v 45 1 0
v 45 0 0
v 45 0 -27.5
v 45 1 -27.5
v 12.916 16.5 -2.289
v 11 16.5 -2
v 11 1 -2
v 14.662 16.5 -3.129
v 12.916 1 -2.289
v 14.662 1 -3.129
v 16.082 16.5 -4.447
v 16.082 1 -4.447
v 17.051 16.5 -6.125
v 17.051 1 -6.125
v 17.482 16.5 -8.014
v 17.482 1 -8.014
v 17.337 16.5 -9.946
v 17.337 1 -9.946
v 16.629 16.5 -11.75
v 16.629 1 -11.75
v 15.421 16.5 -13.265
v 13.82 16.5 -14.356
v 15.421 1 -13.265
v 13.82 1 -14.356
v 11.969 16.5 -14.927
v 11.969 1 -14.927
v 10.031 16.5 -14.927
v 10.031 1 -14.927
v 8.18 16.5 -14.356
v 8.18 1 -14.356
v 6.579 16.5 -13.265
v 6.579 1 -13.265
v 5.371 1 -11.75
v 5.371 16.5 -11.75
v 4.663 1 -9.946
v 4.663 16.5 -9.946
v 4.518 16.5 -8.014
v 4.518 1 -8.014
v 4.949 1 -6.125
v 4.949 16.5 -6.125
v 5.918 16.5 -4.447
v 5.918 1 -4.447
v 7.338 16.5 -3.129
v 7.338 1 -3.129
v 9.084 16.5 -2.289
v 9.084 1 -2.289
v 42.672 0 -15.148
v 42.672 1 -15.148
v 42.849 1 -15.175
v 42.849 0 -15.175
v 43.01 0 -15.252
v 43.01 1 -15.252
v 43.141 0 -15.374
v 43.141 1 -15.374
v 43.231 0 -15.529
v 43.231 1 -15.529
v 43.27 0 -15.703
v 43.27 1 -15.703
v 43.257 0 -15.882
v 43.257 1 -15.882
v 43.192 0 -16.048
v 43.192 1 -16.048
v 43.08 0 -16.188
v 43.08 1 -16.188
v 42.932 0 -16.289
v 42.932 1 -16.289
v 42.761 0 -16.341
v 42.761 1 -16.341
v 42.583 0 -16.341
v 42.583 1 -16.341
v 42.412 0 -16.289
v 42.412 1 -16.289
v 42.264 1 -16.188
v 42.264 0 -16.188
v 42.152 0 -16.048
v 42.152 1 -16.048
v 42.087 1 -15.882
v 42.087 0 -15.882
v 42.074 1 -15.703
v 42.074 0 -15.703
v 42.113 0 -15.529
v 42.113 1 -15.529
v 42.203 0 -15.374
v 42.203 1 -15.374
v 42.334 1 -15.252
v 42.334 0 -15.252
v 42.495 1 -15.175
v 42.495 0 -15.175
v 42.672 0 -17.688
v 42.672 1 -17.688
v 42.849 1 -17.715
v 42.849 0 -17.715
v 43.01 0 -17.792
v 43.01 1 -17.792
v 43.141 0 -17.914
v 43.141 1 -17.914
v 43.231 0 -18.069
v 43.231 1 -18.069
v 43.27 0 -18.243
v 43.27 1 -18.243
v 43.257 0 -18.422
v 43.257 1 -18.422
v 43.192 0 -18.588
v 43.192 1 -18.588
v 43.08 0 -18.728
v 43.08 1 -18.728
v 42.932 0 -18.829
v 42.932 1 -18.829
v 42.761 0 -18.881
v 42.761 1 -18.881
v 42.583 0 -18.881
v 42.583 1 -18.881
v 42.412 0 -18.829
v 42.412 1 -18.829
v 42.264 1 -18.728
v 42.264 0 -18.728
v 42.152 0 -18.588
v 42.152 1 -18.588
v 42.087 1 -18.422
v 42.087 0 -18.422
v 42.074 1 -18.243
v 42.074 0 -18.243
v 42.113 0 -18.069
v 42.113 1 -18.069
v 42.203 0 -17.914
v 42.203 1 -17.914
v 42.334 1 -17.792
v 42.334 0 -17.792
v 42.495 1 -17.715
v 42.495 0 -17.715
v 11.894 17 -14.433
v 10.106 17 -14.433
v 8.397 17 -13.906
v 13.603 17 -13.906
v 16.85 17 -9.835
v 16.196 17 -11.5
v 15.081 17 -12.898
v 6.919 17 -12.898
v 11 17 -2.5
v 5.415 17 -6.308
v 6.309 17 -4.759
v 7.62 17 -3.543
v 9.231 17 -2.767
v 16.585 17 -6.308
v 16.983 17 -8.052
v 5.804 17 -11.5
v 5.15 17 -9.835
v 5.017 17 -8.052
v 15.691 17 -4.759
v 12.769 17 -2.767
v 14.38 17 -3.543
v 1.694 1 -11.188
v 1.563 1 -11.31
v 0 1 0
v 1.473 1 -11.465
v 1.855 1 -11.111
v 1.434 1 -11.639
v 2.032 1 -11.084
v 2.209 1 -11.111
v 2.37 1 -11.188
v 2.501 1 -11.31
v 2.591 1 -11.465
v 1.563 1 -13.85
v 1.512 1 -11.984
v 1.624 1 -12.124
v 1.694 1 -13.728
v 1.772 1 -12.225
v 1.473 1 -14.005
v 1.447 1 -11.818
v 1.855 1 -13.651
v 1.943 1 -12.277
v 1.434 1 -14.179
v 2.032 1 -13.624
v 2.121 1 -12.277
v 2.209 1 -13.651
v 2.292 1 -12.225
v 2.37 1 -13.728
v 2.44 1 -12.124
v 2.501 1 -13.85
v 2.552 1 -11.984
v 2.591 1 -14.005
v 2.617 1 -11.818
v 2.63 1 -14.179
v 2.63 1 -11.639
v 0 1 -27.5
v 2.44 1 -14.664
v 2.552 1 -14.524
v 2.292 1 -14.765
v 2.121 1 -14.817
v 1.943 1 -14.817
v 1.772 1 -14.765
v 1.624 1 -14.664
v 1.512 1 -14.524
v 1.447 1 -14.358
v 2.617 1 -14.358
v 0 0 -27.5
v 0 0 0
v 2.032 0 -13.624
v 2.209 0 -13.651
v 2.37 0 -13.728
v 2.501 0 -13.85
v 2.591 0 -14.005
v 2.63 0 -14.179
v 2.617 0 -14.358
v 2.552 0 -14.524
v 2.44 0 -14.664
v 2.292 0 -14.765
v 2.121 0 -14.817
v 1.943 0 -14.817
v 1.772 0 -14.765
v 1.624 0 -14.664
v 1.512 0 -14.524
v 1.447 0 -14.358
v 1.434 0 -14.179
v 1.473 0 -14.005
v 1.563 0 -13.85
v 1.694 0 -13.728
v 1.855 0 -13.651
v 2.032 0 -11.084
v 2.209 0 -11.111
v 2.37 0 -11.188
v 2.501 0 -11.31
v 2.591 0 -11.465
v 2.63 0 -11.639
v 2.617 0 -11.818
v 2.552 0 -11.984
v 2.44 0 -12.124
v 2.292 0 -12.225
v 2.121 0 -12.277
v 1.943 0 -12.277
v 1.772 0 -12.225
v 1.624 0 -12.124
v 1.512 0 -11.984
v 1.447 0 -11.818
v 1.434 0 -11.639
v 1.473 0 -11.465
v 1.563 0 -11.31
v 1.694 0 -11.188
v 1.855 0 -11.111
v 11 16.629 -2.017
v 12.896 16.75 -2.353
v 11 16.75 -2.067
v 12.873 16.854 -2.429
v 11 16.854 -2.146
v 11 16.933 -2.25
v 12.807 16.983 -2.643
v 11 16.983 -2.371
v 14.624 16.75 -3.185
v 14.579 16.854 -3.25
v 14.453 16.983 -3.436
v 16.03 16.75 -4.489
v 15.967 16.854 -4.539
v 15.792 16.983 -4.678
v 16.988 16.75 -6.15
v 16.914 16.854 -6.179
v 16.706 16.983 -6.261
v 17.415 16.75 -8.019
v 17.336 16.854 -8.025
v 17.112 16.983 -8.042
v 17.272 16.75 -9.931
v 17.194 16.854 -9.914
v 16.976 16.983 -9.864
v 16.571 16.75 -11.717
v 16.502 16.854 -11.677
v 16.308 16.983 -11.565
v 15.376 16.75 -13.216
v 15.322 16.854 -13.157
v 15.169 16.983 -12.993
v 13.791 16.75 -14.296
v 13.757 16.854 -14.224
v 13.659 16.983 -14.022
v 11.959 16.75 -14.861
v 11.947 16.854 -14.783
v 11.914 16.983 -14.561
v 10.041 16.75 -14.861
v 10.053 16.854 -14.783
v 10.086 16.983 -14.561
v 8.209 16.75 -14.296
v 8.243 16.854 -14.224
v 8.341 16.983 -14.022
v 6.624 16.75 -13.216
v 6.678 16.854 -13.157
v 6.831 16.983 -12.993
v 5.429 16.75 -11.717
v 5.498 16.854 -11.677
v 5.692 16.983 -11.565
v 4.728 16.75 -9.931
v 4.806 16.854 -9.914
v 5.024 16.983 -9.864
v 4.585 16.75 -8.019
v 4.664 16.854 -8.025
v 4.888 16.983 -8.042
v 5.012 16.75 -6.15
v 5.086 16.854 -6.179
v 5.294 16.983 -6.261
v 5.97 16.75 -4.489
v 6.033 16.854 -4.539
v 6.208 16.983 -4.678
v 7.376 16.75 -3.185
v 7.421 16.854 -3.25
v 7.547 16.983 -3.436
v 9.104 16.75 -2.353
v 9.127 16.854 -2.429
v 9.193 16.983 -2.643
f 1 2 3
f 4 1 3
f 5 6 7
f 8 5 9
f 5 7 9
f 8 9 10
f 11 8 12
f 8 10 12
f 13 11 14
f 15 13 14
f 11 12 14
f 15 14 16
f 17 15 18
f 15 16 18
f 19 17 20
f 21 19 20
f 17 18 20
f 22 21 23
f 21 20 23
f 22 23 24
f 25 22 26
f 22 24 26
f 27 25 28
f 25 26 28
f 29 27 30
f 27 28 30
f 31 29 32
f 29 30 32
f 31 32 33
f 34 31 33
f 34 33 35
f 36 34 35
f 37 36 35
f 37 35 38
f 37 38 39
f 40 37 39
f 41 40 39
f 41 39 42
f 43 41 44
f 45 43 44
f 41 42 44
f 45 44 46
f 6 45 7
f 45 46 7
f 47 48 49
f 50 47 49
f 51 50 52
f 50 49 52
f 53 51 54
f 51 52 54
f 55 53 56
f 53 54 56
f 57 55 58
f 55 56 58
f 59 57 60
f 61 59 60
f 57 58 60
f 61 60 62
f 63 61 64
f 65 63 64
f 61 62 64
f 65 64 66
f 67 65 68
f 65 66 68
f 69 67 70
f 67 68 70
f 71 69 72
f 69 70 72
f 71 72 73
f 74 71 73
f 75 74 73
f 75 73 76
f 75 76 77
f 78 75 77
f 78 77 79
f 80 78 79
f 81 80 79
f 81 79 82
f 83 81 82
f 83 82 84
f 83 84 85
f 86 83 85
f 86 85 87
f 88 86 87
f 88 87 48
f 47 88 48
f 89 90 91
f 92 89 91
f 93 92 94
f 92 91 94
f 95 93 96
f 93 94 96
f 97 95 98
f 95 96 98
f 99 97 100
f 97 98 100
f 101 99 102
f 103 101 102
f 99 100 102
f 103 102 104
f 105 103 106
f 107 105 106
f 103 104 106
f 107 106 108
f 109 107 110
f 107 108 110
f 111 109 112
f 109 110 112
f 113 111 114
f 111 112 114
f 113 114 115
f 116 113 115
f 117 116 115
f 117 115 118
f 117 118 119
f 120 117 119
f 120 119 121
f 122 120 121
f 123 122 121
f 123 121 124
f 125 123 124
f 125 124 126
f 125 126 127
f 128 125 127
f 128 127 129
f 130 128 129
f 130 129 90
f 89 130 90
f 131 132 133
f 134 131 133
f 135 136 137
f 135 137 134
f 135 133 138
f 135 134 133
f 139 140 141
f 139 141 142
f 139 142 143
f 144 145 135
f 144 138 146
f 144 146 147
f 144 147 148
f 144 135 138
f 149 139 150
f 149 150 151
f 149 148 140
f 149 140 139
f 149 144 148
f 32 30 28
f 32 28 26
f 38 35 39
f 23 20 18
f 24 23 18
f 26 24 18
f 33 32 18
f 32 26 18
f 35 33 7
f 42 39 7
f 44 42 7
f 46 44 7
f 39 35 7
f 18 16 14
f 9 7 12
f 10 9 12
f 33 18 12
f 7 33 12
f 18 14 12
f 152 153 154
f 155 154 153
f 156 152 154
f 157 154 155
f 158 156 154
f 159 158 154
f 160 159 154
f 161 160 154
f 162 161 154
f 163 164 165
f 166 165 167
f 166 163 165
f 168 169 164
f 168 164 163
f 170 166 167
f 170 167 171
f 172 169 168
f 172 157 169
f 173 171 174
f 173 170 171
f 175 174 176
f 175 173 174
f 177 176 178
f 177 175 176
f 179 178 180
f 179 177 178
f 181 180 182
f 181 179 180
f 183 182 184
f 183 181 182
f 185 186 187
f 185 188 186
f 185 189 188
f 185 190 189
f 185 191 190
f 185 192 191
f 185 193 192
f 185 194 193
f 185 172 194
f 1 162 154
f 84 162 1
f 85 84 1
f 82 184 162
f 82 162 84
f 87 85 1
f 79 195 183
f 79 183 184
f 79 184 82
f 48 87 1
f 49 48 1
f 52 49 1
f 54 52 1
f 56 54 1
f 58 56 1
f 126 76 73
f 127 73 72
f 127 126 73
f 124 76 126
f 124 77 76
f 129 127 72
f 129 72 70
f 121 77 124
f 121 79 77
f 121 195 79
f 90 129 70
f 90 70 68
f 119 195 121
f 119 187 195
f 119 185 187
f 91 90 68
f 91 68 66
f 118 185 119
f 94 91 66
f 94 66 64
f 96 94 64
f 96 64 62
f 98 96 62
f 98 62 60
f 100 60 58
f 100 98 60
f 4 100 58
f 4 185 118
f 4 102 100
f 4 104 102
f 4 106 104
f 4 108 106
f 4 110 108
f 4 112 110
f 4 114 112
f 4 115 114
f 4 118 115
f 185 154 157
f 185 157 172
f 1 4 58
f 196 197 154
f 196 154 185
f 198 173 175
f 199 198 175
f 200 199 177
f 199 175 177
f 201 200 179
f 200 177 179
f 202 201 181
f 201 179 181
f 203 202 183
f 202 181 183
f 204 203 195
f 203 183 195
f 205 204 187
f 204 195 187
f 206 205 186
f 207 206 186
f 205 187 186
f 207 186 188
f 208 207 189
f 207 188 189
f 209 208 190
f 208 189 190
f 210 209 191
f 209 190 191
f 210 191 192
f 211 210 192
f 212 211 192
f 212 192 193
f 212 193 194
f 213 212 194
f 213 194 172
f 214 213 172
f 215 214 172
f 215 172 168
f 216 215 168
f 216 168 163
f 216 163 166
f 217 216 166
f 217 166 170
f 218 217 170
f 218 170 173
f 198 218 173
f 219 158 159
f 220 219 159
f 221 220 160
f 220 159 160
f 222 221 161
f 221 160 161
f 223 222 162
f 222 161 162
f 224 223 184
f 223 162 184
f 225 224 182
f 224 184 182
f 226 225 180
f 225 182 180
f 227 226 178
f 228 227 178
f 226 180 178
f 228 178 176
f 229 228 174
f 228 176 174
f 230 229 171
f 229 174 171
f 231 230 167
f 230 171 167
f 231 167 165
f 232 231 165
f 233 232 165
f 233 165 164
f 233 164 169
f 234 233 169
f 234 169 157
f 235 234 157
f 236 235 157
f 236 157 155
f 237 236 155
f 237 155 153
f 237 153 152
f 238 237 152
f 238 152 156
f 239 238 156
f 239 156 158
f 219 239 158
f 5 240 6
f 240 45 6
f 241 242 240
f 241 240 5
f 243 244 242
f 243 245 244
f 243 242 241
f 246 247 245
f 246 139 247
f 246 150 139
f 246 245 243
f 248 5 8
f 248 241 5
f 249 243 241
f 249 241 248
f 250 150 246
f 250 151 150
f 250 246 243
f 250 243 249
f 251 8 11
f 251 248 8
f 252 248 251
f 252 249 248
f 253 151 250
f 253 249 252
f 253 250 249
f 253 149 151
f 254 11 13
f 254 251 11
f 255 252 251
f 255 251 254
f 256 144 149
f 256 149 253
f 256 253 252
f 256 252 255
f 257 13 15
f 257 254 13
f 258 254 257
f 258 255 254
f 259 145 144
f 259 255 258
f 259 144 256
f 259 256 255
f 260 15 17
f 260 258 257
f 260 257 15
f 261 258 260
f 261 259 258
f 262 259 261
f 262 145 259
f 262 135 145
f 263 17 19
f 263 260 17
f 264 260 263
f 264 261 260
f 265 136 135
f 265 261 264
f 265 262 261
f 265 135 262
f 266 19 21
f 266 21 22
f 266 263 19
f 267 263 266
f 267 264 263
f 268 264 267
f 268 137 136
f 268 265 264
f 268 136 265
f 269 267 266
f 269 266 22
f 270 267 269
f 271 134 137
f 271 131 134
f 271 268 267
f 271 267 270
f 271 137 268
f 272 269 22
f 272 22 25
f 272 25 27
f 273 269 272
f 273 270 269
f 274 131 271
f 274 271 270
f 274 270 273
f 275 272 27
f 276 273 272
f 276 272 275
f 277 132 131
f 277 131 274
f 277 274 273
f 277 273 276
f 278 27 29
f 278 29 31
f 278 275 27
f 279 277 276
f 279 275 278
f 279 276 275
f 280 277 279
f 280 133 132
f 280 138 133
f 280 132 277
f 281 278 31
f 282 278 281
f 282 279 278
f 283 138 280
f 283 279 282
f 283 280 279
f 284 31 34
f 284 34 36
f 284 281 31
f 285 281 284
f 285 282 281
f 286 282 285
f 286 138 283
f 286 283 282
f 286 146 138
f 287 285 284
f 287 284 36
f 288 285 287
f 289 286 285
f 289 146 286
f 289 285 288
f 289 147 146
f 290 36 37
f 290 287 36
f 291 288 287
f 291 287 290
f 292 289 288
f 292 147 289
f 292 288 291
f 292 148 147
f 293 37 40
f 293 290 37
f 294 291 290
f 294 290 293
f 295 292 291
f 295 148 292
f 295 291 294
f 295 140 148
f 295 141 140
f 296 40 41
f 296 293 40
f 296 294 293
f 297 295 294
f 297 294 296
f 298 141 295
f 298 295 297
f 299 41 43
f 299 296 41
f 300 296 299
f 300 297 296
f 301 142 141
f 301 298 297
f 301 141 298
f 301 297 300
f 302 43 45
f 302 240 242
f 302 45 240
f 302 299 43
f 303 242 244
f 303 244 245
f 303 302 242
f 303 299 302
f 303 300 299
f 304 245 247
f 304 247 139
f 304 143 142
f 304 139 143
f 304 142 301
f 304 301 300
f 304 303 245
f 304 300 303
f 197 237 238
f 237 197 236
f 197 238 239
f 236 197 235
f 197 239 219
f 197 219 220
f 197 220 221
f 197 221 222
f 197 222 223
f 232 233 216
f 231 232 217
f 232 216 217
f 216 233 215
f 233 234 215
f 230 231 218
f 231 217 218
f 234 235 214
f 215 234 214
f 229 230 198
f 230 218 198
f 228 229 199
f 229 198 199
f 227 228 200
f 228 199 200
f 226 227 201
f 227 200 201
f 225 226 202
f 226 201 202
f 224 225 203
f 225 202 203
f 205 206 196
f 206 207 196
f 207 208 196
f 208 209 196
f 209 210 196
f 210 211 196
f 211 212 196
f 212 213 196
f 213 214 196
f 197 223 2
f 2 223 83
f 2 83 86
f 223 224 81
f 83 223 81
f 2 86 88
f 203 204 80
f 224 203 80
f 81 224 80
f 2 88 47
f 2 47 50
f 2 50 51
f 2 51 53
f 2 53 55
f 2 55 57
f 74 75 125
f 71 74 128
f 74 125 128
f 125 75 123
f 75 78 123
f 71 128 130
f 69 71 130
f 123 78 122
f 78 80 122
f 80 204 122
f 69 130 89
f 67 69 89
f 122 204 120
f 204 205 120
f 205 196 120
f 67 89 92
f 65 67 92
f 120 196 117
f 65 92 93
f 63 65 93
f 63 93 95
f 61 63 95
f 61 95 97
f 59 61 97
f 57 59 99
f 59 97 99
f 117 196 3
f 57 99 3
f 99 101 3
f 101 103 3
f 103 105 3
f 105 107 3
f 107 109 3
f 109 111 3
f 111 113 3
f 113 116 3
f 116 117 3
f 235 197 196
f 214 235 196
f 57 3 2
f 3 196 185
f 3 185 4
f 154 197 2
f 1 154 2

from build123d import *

# Parameters (mm, degrees)
SKETCH_1_W          = 45
SKETCH_1_H          = 27.5
EXTRUDE_1_DEPTH     = 1
SKETCH_2_R          = 6.5
EXTRUDE_2_DEPTH     = 16
FILLET_1_R          = 0.5
SKETCH_5_R          = 0.6
CUT_EXTRUDE_1_DEPTH = 56.11125112


with BuildPart() as part:
    # Эскиз1 → Бобышка-Вытянуть1 (new body)
    with BuildSketch(Plane(origin=(0, 0, 0), x_dir=(1, 0, 0), z_dir=(0, 1, 0))):
        with Locations((22.5, 13.75)):
            Rectangle(SKETCH_1_W, SKETCH_1_H)
    extrude(amount=EXTRUDE_1_DEPTH)

    # Эскиз5 → Вырез-Вытянуть1 (cut, through all)
    with BuildSketch(Plane(origin=(0, 1, 0), x_dir=(1, 0, 0), z_dir=(0, 1, 0))):
        with Locations(Location((2.032, 14.224, 0), (0, 0, 270))):
            Circle(SKETCH_5_R)
        with Locations(Location((2.032, 11.684, 0), (0, 0, 270))):
            Circle(SKETCH_5_R)
        with Locations(Location((42.672, 18.288, 0), (0, 0, 270))):
            Circle(SKETCH_5_R)
        with Locations(Location((42.672, 15.748, 0), (0, 0, 270))):
            Circle(SKETCH_5_R)
    extrude(amount=-CUT_EXTRUDE_1_DEPTH, mode=Mode.SUBTRACT)


with BuildPart() as body_2:
    # Эскиз2 → Бобышка-Вытянуть2 (new body)
    with BuildSketch(Plane(origin=(0, 1, 0), x_dir=(1, 0, 0), z_dir=(0, 1, 0))):
        with Locations(Location((11, 8.5, 0), (0, 0, 270))):
            Circle(SKETCH_2_R)
    extrude(amount=EXTRUDE_2_DEPTH)

    # Скругление1
    fillet_1_edges = [body_2.edges().sort_by_distance(p)[0] for p in [
        (11, 17, -15),
    ]]
    fillet(fillet_1_edges, radius=FILLET_1_R)


solid = Compound([part.part, body_2.part])
